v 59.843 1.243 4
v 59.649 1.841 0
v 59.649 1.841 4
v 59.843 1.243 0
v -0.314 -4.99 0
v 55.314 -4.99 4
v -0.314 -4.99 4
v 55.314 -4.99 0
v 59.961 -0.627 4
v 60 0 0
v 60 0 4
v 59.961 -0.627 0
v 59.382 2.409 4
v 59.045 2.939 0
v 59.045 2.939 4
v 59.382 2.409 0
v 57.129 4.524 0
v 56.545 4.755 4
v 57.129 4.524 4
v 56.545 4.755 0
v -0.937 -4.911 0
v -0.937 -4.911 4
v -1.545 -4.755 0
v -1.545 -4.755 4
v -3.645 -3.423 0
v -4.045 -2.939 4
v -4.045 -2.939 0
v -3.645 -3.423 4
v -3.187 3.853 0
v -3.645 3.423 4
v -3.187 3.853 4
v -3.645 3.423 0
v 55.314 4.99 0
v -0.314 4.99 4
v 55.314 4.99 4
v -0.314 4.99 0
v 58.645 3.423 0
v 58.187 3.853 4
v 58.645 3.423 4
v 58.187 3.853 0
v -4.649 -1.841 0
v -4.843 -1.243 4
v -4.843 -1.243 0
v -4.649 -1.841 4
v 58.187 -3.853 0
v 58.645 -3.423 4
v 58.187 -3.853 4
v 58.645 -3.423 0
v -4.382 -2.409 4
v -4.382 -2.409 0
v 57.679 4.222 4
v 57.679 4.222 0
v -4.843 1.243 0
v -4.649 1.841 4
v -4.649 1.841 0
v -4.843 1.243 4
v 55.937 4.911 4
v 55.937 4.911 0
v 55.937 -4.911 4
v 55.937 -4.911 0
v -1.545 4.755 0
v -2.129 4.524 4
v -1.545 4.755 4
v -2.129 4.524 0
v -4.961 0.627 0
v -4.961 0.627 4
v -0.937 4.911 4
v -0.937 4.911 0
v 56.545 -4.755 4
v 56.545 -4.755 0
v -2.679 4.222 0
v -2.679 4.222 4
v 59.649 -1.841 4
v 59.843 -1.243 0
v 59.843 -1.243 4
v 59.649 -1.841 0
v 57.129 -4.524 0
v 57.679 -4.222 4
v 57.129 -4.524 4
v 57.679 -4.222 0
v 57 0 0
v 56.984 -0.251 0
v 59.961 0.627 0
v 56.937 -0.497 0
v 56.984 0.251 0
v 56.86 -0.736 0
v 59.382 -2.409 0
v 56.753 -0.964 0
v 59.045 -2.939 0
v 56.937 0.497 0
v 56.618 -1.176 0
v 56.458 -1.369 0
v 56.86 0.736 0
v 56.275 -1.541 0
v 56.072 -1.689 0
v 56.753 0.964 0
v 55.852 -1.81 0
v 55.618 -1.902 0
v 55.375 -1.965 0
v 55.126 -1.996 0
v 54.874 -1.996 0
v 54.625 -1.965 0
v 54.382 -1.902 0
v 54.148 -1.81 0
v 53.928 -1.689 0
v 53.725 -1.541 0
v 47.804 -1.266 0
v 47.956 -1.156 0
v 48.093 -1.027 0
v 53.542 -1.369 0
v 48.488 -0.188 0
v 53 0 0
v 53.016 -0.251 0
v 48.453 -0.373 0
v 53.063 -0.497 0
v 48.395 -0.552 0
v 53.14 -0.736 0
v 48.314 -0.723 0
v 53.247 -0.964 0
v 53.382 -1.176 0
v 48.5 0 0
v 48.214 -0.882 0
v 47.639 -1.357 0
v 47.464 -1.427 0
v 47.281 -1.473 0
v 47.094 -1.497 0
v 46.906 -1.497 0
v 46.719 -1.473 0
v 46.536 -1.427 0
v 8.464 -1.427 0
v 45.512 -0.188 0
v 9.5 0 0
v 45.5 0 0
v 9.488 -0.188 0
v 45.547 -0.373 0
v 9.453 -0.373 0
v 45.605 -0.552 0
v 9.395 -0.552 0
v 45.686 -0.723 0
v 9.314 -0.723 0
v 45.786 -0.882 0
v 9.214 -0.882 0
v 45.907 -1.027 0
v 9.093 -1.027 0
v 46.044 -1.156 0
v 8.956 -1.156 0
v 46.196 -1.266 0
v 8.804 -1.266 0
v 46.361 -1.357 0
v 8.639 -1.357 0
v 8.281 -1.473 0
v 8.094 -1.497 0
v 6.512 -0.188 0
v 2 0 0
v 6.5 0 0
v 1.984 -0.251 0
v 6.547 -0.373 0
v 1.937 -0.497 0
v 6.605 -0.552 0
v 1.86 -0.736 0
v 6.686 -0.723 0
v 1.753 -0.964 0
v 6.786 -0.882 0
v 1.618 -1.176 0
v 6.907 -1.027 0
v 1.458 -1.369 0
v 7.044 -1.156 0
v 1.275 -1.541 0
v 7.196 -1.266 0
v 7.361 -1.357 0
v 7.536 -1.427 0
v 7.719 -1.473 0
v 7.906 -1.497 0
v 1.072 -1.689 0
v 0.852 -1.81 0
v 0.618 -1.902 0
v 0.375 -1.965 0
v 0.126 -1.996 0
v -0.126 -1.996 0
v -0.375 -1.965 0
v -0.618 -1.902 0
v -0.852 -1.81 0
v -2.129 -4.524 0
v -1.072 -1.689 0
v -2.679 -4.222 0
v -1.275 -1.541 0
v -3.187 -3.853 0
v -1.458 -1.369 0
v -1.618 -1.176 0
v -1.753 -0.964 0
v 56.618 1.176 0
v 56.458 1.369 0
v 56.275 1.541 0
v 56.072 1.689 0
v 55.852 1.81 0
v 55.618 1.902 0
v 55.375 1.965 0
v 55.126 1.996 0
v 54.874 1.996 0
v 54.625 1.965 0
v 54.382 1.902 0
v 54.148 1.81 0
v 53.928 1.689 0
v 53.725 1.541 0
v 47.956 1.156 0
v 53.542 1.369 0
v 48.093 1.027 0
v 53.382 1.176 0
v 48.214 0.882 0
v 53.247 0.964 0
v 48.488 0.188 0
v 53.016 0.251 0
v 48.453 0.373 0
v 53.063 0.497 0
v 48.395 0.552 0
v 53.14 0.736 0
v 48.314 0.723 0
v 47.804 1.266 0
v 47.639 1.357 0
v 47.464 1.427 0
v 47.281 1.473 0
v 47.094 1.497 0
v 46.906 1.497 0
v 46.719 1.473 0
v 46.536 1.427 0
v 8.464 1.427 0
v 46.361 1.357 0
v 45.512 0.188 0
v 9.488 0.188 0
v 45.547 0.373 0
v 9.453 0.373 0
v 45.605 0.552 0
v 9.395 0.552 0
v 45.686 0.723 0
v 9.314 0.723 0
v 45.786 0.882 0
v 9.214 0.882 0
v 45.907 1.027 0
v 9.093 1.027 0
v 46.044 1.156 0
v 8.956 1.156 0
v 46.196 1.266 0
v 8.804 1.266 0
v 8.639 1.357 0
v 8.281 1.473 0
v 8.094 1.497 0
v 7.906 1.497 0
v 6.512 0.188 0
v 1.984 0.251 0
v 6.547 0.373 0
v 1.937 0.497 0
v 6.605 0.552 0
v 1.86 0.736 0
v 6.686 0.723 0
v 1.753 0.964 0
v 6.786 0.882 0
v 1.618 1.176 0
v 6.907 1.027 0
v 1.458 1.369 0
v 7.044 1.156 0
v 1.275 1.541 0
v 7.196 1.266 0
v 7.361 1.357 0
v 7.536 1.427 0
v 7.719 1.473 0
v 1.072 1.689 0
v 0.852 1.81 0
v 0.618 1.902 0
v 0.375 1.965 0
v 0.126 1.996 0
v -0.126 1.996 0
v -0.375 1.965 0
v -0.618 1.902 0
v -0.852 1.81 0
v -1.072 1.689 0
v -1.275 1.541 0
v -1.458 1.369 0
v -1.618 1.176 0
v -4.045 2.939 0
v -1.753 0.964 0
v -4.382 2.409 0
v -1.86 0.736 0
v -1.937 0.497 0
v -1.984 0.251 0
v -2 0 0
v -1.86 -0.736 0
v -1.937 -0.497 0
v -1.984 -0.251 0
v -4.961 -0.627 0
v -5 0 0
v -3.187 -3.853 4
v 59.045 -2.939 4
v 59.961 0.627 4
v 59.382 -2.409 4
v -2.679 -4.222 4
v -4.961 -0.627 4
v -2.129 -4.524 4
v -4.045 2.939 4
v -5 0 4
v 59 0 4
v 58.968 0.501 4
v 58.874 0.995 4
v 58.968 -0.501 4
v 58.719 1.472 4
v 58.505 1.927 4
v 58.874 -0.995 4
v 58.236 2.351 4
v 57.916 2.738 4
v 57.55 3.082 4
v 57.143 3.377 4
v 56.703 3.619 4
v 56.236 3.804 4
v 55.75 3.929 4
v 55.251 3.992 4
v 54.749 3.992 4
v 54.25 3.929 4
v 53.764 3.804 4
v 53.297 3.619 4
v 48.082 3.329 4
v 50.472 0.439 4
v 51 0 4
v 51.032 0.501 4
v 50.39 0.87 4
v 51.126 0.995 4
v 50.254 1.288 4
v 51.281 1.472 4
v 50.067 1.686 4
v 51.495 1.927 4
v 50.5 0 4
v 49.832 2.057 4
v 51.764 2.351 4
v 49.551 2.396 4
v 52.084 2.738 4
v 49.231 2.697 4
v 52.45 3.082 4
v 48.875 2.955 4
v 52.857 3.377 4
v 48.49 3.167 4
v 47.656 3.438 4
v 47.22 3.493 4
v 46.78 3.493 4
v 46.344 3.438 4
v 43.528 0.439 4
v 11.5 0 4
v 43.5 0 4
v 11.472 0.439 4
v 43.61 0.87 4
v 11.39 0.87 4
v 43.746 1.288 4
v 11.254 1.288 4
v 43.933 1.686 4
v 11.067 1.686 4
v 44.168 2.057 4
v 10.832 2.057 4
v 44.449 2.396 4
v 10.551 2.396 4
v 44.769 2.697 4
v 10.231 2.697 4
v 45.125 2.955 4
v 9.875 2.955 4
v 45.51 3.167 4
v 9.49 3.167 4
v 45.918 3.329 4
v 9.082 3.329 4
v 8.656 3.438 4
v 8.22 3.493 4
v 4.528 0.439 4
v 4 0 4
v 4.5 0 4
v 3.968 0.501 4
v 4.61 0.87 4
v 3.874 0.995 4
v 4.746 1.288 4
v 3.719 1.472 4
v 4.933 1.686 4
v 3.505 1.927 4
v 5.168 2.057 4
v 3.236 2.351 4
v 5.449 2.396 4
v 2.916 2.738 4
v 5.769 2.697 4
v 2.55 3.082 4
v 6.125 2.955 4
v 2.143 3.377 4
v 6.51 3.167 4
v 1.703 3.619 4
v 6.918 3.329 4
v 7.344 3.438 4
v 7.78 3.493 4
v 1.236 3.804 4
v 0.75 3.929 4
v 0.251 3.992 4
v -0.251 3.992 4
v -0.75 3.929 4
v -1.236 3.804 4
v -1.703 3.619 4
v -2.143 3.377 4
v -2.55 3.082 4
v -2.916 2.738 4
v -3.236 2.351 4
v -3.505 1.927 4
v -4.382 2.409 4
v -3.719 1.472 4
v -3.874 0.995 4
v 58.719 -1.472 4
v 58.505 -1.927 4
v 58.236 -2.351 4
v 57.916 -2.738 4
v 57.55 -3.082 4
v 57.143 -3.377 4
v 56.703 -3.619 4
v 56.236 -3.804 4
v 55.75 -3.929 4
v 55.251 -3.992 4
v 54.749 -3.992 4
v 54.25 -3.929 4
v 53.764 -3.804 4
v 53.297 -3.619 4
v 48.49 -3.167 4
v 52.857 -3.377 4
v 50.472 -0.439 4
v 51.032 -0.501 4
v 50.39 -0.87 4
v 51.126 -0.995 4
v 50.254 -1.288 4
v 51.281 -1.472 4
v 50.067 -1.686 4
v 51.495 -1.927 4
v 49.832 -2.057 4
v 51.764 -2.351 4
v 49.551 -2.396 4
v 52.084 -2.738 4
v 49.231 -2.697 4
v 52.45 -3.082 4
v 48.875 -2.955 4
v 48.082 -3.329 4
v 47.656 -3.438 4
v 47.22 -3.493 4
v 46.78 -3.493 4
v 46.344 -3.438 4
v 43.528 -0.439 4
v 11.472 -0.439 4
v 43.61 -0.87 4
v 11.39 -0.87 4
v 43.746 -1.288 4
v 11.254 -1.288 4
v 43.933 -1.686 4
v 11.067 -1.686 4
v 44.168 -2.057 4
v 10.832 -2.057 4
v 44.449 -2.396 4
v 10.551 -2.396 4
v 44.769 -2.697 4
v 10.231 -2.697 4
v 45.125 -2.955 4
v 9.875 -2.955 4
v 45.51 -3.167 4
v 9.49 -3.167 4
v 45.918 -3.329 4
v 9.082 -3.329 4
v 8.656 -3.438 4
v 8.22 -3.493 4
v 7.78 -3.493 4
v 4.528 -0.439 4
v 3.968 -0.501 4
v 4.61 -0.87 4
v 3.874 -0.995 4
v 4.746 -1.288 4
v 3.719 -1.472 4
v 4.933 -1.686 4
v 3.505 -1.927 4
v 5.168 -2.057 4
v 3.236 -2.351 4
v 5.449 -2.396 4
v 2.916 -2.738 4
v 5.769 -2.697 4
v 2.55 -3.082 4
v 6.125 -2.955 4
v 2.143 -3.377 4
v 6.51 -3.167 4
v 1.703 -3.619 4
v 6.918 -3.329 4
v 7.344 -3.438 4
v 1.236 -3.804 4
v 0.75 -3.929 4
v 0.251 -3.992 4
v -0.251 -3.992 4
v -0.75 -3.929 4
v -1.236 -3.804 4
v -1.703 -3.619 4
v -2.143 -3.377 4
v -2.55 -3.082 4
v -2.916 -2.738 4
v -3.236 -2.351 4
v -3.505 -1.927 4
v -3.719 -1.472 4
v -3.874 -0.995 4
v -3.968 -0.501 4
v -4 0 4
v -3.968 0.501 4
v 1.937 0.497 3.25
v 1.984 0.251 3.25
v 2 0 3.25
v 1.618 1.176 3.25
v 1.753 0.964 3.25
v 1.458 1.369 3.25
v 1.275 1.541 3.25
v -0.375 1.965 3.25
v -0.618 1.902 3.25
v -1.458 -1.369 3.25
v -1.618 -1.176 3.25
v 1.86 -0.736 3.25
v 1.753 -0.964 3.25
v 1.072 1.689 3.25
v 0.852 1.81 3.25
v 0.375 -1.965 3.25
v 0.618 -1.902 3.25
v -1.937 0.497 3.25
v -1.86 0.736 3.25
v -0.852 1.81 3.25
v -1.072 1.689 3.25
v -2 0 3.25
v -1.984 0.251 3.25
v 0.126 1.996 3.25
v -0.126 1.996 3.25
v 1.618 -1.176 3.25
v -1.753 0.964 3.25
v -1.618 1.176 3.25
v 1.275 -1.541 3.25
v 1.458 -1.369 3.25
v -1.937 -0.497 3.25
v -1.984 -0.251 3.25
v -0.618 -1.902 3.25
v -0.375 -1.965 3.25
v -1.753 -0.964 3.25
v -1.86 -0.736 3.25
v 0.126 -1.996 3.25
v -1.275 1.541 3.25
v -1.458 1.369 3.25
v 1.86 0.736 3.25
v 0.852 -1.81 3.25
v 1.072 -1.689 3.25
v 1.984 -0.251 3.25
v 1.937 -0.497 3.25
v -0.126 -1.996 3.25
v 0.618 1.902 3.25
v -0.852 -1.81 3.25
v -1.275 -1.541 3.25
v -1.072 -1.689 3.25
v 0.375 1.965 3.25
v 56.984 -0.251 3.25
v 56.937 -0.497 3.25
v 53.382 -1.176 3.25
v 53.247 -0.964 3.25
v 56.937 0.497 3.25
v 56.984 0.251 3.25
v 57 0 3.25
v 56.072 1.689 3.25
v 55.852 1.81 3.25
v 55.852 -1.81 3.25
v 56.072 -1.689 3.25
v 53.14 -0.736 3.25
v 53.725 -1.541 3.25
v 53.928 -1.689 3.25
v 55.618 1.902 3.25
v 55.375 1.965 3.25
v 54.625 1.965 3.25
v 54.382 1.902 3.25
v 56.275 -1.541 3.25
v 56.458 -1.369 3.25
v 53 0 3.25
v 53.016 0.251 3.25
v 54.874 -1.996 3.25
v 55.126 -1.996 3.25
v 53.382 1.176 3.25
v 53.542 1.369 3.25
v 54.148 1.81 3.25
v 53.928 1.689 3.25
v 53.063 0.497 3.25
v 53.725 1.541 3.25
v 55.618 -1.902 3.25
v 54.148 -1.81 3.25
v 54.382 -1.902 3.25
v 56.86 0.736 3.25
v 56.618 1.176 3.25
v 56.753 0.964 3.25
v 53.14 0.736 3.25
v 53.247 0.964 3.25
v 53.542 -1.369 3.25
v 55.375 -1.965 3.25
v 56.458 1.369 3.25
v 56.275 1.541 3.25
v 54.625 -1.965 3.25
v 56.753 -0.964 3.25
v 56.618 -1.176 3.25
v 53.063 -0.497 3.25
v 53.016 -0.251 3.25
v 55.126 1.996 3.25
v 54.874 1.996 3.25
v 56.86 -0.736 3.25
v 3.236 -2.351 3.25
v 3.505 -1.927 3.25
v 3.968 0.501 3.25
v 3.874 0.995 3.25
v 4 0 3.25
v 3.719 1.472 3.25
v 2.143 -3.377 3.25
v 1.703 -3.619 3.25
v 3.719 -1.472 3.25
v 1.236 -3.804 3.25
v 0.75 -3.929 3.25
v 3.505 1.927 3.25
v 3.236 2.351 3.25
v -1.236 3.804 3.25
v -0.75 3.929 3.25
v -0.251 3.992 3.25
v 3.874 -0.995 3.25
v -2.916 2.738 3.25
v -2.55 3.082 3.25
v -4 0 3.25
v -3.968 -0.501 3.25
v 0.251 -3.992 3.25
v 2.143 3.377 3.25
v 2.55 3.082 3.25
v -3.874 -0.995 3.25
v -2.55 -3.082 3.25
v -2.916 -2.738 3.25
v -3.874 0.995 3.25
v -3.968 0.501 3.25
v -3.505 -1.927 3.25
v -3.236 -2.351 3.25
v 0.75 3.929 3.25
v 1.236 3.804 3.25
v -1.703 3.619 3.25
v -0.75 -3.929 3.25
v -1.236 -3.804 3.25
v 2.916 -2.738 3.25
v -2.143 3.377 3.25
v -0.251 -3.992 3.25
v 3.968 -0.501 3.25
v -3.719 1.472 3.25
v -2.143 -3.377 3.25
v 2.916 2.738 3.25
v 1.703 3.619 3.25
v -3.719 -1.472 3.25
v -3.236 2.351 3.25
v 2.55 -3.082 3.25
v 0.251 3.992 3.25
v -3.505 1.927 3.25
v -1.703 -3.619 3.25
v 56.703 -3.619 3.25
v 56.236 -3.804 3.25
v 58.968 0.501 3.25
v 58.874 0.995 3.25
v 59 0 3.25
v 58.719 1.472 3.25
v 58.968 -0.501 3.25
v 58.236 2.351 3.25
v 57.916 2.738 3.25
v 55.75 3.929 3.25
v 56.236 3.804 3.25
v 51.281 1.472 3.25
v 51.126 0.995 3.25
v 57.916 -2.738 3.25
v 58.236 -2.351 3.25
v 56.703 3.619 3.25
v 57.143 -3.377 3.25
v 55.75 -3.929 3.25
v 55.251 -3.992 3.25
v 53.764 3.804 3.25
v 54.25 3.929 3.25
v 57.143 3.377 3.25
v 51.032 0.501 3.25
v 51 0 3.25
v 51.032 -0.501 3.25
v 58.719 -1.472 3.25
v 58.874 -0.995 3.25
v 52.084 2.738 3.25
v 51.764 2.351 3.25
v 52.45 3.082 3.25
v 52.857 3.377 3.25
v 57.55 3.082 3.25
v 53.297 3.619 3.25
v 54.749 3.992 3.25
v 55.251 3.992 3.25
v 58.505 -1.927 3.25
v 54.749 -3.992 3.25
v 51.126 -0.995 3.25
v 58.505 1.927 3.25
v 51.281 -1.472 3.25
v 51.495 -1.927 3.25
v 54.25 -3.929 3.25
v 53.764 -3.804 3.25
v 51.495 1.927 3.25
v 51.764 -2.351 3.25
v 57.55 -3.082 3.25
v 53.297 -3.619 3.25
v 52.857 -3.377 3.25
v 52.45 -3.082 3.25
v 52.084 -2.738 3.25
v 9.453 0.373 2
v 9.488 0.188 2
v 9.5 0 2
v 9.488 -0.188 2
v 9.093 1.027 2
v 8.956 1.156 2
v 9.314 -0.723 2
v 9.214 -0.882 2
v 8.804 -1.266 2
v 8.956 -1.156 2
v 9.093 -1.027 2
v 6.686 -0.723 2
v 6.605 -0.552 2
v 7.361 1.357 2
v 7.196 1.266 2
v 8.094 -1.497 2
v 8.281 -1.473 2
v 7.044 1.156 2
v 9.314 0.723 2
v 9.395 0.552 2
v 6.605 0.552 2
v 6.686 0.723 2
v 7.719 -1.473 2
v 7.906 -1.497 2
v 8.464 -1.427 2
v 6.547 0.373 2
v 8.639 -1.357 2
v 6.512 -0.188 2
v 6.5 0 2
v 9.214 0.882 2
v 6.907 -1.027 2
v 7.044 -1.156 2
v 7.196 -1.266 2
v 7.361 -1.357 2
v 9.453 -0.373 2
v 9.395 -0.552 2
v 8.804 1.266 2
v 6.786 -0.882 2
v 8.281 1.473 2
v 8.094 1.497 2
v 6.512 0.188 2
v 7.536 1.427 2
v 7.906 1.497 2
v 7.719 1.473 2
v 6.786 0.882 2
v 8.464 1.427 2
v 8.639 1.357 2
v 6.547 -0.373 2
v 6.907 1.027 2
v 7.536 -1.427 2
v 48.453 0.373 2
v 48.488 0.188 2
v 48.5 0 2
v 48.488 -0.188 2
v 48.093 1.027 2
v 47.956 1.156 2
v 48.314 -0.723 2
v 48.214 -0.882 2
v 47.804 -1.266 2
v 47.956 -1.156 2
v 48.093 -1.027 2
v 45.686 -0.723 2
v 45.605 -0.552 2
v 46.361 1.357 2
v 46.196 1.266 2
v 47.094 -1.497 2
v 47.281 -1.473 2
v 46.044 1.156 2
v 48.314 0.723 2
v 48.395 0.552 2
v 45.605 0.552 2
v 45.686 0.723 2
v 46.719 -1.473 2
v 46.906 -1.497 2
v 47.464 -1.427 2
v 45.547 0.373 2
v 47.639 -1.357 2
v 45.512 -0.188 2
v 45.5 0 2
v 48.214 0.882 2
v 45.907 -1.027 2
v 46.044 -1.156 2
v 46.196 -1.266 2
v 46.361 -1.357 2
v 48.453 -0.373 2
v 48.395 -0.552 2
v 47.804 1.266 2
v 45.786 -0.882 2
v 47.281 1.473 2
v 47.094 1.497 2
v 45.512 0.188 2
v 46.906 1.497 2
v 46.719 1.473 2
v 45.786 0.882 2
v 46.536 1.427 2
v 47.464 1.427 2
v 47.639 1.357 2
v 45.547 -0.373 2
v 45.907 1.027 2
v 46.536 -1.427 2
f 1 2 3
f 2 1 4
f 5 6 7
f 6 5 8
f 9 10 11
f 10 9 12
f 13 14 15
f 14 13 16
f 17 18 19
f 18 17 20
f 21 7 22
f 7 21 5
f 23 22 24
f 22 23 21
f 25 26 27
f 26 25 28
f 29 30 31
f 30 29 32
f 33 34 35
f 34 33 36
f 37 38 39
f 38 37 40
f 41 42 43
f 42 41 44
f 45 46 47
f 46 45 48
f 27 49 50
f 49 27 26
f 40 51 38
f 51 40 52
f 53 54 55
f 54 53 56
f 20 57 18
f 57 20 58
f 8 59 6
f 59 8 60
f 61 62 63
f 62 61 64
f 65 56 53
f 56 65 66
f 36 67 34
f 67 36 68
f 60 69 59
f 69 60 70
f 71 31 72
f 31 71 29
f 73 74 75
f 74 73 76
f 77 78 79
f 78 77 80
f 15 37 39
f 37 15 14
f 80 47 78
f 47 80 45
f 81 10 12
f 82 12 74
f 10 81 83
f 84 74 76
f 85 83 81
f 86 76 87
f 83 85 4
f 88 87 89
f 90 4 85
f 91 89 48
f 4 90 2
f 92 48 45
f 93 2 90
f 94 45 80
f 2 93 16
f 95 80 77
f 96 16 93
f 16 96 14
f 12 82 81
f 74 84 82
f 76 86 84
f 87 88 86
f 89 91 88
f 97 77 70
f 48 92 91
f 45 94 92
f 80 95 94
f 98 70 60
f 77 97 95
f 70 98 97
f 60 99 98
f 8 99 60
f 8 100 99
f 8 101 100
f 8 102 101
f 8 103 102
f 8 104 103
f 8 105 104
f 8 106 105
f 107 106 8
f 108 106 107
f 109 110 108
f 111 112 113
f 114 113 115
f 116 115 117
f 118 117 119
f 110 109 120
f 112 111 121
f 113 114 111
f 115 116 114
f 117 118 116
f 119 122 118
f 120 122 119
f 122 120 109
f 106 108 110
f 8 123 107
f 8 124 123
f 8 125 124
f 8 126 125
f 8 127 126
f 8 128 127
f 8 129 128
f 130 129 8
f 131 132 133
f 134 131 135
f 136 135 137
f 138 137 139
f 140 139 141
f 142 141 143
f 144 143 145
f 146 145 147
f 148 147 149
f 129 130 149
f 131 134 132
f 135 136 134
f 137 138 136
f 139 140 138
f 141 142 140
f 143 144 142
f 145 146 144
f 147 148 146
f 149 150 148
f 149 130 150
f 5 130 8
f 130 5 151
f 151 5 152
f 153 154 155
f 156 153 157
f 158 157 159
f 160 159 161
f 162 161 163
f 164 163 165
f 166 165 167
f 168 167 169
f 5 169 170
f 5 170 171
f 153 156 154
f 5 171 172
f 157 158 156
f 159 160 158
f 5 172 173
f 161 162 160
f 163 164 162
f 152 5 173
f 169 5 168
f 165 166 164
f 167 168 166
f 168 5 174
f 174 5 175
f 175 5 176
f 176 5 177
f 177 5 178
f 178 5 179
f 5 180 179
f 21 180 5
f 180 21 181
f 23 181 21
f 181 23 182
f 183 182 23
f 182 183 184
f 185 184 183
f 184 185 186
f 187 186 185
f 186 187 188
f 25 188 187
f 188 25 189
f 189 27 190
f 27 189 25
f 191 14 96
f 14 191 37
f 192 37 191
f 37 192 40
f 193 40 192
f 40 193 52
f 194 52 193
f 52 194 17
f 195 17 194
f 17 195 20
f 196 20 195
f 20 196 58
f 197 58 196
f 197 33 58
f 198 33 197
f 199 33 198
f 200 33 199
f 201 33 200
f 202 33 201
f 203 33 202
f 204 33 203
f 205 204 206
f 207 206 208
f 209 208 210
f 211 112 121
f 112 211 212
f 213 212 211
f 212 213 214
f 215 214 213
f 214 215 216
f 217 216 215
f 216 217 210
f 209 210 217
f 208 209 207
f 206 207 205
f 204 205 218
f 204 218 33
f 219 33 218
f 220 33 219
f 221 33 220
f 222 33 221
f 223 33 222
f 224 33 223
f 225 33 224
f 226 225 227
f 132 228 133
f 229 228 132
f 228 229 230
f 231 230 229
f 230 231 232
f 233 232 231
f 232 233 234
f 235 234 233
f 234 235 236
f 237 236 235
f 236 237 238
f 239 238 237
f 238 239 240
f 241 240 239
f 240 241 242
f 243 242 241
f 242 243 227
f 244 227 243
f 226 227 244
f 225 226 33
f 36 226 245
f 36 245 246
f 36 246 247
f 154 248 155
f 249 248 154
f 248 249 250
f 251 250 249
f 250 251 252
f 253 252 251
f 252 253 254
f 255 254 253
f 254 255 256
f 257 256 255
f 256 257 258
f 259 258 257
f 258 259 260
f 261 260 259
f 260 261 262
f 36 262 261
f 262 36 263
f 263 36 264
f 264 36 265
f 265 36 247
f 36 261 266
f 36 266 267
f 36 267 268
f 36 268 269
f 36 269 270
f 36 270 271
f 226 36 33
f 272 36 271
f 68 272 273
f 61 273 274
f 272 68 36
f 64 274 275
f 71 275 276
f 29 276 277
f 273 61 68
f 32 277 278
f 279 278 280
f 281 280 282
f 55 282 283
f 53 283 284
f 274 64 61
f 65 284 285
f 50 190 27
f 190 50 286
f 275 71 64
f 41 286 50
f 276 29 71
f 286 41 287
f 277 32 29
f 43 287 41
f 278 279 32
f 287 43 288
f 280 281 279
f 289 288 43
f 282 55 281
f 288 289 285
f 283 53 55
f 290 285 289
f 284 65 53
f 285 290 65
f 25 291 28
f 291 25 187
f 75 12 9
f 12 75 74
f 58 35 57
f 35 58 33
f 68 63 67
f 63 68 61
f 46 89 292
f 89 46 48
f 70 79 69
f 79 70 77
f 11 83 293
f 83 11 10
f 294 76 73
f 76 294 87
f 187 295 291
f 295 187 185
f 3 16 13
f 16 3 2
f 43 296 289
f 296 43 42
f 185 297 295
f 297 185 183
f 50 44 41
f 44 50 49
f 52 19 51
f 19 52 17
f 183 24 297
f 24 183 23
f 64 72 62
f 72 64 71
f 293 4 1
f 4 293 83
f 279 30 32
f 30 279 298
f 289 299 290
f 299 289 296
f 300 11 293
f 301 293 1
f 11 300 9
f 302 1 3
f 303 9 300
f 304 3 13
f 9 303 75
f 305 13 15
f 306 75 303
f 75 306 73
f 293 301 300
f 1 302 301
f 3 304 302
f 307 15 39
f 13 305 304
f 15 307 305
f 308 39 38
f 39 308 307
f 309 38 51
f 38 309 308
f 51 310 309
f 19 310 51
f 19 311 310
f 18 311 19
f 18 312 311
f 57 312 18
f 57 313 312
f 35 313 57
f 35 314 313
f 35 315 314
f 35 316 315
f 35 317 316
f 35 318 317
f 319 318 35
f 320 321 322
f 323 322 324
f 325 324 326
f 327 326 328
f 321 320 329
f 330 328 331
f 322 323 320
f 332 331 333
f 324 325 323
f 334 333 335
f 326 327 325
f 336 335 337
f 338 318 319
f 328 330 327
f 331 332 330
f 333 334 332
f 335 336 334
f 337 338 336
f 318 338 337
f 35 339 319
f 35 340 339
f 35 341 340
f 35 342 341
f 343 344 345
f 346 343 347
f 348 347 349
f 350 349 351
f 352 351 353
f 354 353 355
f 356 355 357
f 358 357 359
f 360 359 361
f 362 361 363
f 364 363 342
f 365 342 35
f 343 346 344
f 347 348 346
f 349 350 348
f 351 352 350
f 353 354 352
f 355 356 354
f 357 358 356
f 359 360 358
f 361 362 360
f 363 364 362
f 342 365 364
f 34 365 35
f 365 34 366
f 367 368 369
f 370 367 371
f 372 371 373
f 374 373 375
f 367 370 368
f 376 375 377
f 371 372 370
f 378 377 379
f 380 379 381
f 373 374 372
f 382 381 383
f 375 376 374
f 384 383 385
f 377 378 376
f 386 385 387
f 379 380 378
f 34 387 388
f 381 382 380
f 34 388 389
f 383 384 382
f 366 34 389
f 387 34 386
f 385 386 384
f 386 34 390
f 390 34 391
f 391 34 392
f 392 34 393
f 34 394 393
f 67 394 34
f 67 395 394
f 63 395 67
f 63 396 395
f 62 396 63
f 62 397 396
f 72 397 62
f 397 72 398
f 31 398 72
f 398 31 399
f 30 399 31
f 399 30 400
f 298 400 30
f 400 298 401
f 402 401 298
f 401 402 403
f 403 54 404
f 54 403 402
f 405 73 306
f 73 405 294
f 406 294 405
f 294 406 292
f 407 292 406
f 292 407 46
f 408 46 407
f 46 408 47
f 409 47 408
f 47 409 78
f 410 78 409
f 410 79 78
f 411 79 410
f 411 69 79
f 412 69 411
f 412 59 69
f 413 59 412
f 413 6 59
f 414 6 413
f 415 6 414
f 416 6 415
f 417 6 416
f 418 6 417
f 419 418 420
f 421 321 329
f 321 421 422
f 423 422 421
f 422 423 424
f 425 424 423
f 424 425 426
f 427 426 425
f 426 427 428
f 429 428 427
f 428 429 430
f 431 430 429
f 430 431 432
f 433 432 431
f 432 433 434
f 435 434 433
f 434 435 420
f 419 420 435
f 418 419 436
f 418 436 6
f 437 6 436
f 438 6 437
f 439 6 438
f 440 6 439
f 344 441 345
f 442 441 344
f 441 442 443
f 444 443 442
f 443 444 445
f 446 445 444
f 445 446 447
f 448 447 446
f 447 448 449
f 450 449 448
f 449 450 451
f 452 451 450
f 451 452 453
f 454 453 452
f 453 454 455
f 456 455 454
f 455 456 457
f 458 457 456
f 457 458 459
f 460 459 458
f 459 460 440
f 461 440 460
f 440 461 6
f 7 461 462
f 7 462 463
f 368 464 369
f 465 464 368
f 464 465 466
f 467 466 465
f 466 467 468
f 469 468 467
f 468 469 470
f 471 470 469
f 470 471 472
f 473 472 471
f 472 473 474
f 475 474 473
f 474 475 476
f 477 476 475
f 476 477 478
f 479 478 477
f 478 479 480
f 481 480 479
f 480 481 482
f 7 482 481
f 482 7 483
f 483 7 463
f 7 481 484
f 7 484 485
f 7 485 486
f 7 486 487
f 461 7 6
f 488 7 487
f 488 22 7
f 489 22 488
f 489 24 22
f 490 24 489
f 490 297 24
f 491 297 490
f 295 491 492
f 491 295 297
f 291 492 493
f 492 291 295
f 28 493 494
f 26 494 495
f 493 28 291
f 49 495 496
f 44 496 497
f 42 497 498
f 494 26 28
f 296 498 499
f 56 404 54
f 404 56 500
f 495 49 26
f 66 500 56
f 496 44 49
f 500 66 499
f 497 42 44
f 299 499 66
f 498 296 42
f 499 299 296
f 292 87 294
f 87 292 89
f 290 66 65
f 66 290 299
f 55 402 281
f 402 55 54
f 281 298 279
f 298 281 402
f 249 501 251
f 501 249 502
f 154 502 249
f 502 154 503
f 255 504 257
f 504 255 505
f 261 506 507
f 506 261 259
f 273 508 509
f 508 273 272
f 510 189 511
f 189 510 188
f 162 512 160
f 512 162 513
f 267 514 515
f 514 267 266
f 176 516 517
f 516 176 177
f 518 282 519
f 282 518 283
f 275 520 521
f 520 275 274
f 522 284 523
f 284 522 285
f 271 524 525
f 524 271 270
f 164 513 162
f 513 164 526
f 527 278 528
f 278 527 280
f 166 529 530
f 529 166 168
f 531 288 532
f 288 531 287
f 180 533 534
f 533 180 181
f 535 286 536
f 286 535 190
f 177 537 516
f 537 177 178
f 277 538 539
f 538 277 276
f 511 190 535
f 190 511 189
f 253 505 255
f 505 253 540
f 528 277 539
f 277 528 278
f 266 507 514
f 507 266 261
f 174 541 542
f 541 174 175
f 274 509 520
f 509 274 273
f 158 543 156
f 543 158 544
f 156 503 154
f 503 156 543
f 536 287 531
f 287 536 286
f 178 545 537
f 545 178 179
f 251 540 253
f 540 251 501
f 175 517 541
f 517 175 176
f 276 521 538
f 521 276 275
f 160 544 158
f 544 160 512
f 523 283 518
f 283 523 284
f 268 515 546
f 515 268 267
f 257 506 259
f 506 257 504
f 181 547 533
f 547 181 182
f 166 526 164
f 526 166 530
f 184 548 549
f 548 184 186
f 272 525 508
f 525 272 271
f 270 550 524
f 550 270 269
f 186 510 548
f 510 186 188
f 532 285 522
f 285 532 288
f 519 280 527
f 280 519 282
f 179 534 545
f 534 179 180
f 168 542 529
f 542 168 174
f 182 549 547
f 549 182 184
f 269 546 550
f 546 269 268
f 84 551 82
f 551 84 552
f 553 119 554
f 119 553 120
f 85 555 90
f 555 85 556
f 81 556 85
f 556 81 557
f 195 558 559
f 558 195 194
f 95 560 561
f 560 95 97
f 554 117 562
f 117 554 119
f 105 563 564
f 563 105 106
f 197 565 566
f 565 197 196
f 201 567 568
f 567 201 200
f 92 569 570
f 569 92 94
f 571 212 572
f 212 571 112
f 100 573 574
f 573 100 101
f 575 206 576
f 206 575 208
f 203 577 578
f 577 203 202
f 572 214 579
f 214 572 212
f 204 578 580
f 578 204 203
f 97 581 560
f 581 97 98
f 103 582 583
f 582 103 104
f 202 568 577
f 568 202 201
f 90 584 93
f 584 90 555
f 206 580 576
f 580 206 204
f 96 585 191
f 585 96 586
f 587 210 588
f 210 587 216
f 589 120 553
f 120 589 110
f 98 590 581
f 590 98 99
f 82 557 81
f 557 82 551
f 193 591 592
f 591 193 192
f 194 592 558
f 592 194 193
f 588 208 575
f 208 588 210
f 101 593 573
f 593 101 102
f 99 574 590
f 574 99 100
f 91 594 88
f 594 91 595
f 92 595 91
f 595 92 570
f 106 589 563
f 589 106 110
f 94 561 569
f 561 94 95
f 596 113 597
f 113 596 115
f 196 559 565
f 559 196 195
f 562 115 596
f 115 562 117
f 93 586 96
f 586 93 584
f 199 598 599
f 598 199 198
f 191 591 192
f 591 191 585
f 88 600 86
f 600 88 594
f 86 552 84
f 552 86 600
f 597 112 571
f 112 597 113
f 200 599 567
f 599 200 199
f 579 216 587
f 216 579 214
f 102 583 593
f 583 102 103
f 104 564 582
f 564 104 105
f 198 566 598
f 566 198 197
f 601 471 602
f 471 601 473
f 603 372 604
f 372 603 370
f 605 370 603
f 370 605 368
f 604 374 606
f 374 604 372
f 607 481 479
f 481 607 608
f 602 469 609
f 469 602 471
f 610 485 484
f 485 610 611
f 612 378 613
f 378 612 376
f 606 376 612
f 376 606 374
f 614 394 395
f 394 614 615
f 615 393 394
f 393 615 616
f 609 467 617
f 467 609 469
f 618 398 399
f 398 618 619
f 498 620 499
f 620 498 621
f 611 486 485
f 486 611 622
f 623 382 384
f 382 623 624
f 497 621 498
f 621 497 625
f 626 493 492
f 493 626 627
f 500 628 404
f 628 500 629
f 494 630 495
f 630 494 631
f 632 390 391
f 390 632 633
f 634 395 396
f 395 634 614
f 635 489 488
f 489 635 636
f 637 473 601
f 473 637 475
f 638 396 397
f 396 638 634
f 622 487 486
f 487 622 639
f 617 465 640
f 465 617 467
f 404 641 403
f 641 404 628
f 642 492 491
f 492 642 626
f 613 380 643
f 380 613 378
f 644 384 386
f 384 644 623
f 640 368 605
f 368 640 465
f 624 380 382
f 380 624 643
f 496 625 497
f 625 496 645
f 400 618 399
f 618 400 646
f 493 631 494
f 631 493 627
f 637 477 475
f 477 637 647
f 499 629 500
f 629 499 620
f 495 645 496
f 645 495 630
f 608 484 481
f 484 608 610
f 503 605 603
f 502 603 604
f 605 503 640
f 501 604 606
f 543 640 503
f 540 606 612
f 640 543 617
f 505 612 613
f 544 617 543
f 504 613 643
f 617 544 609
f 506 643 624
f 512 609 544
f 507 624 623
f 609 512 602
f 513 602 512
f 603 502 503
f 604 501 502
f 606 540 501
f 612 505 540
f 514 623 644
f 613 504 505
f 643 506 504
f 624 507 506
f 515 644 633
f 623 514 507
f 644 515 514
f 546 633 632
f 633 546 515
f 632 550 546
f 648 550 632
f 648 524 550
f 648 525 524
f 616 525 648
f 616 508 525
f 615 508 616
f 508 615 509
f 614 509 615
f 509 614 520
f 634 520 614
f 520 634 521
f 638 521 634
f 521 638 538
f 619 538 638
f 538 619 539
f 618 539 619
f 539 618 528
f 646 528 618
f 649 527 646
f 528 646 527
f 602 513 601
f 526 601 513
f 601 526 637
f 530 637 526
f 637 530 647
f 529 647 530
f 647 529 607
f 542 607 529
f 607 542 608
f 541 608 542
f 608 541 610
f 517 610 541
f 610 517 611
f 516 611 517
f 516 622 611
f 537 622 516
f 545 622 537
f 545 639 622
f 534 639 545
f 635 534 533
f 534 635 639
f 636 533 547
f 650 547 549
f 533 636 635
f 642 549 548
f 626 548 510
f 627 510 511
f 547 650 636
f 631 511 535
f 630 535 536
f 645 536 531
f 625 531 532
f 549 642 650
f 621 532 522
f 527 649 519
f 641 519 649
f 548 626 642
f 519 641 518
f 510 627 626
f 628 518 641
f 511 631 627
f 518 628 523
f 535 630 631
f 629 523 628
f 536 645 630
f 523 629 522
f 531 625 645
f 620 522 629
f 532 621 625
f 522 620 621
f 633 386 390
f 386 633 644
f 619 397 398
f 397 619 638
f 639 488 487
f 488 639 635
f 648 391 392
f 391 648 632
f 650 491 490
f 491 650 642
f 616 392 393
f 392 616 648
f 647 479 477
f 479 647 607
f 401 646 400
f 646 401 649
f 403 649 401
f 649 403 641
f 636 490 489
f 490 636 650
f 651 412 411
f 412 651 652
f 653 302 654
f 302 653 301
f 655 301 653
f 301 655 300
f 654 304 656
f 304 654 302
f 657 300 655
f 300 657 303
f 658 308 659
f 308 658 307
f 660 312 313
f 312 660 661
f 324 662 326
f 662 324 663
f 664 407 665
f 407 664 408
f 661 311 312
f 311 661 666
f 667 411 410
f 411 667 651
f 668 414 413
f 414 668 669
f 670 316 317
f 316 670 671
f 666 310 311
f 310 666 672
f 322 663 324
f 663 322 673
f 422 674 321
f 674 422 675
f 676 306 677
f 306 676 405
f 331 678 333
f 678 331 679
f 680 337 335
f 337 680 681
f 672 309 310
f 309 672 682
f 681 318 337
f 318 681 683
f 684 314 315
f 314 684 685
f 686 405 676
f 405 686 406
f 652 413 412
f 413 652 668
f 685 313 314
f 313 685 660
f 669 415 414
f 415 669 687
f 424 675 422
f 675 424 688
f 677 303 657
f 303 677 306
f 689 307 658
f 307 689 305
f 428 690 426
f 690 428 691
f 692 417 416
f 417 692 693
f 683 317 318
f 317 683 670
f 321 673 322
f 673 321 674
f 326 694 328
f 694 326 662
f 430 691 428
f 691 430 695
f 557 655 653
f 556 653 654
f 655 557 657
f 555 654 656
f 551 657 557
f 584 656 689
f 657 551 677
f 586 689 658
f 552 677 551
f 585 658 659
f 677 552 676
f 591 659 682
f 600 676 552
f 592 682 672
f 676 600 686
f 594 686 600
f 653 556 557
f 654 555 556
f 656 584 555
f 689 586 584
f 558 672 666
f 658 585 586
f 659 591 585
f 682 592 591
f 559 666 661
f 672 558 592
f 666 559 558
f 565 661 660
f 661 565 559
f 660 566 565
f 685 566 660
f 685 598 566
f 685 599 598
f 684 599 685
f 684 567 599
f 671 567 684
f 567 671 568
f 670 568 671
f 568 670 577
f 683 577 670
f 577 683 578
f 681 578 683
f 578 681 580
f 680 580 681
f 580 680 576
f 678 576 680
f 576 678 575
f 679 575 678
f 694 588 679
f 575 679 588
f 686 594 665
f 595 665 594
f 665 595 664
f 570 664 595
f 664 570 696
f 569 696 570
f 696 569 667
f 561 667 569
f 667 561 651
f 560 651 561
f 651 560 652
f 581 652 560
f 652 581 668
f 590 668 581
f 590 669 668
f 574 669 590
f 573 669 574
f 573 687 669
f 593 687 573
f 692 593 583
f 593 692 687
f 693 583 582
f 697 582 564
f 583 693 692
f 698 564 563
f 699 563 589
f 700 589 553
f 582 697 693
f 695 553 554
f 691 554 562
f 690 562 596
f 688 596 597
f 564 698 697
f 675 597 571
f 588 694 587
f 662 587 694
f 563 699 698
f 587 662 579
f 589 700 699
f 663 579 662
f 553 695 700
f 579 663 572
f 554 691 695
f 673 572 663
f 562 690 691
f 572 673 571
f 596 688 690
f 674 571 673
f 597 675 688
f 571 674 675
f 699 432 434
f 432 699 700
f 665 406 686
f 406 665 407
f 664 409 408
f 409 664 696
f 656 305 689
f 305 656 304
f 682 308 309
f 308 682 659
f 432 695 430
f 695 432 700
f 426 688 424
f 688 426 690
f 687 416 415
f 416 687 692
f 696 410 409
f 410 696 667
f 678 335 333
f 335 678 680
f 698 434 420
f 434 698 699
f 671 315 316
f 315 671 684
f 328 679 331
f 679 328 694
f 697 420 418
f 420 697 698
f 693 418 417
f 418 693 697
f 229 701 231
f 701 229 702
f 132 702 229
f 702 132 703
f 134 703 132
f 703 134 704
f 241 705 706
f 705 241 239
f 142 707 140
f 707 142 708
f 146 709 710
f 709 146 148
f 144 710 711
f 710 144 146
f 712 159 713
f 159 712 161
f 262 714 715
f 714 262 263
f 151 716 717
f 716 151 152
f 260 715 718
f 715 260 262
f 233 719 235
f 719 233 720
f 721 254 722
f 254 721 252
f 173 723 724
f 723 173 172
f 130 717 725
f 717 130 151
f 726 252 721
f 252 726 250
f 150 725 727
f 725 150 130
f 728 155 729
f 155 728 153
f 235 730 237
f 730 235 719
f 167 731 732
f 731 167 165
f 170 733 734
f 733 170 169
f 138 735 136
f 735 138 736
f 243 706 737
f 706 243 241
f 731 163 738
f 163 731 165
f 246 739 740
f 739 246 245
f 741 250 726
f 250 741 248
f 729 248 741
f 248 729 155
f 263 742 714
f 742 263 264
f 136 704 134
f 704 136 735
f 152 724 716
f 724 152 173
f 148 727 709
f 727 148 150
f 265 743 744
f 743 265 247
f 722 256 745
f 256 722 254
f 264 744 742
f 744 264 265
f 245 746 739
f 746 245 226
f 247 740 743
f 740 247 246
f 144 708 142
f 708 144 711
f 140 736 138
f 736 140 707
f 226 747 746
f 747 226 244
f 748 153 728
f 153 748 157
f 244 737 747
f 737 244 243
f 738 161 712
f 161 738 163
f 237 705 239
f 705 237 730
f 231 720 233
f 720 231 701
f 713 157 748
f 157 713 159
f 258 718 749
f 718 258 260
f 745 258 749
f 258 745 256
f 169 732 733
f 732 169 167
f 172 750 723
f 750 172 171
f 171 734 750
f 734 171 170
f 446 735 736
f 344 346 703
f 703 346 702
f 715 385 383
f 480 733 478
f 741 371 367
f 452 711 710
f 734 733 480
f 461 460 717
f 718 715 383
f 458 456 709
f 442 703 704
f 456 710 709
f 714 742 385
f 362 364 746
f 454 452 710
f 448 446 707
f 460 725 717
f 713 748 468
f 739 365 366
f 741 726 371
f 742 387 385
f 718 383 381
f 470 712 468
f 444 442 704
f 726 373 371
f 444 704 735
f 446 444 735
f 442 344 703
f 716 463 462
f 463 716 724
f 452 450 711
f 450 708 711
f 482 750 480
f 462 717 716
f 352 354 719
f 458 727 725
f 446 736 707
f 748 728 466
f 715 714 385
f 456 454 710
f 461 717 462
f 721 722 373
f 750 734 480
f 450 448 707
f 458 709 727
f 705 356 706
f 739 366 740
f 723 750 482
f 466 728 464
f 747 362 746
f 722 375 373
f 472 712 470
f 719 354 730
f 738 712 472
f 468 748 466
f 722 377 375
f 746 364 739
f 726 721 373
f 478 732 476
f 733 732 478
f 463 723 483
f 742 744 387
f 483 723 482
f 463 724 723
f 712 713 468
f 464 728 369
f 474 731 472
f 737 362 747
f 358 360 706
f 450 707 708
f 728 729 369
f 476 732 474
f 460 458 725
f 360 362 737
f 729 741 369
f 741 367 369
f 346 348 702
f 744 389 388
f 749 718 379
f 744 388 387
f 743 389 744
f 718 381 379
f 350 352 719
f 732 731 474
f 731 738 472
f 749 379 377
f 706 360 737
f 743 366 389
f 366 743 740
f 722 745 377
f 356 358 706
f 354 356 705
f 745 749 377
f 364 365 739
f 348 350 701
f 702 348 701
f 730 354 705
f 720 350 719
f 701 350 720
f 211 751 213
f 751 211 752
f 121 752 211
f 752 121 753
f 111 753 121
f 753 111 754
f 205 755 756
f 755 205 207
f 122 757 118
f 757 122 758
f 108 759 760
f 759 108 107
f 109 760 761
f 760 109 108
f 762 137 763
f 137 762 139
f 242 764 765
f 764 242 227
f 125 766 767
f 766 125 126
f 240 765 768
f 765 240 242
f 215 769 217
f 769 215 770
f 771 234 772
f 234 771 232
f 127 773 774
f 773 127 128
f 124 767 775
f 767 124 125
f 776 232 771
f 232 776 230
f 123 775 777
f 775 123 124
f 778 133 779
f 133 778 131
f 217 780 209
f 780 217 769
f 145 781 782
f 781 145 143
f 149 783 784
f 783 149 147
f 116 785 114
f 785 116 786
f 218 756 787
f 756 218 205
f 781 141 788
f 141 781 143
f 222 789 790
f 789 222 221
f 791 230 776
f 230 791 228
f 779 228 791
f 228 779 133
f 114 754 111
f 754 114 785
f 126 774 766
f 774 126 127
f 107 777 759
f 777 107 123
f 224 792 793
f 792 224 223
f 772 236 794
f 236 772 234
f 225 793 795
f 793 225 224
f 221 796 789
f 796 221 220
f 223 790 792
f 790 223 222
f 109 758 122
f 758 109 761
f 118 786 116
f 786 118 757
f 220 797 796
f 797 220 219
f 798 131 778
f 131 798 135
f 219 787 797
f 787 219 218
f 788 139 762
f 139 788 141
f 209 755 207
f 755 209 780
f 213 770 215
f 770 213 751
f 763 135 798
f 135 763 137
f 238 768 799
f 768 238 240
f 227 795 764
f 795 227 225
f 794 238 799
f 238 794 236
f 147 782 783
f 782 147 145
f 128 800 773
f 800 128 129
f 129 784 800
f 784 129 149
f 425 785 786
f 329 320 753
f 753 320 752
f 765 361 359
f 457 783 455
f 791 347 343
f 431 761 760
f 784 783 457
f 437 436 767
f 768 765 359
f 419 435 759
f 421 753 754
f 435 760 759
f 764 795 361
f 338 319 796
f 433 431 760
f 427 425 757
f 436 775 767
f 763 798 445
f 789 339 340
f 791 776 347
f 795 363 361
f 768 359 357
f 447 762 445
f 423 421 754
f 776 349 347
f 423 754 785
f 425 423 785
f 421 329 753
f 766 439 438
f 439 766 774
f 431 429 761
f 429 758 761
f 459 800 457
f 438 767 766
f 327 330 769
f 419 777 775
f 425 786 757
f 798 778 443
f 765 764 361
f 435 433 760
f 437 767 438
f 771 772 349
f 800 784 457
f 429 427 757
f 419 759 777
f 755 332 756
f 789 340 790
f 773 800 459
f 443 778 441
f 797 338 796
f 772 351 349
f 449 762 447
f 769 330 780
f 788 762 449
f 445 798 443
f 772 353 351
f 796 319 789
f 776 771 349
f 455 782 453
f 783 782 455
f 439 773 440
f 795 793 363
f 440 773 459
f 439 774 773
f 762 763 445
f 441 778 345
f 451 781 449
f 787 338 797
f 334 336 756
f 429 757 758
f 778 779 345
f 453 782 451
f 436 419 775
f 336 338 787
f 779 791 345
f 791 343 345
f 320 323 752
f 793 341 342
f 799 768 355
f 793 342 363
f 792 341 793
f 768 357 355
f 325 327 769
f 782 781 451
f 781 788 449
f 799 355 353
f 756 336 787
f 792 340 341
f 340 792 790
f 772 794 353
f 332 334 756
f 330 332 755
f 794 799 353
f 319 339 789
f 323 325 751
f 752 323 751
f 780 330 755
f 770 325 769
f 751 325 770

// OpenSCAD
r_m3=2;
r_tete=3.5;
r_trou=1.5;
ep=4;
r_ext=5;
ecart=55;
esp_fix=8;
r_rondelle=4;

module plaque_flanc(){
	difference(){
		hull(){
		//base de la pièce
		cylinder(h=ep, r=r_ext, $fn=50);
		translate([ecart,0,0]){cylinder(h=ep, r=r_ext, $fn=50);}
		}

		//trous pour passer les molettes
		translate([0,0,-5]){cylinder(h=20, r=r_m3, $fn=50);}
		translate([ecart,0,-5]){cylinder(h=20, r=r_m3, $fn=50);}

		//encastrement rondelles d'usure
		translate([0,0,ep-0.75]){cylinder(h=5, r=r_rondelle, $fn=50);}
		translate([ecart,0,ep-0.75]){cylinder(h=5, r=r_rondelle, $fn=50);}

		//trous de vissage
		translate([esp_fix,0,-5]){cylinder(h = 20, r = r_trou, $fn=50);}
		translate([esp_fix,0,ep-2]){cylinder(h = 2, r1 = r_trou, r2=r_tete, $fn=50);}

		translate([ecart-esp_fix,0,-5]){cylinder(h = 20, r = r_trou, $fn=50);}
		translate([ecart-esp_fix,0,ep-2]){cylinder(h = 2, r1 = r_trou, r2=r_tete, $fn=50);}
		
	}

}

plaque_flanc();
